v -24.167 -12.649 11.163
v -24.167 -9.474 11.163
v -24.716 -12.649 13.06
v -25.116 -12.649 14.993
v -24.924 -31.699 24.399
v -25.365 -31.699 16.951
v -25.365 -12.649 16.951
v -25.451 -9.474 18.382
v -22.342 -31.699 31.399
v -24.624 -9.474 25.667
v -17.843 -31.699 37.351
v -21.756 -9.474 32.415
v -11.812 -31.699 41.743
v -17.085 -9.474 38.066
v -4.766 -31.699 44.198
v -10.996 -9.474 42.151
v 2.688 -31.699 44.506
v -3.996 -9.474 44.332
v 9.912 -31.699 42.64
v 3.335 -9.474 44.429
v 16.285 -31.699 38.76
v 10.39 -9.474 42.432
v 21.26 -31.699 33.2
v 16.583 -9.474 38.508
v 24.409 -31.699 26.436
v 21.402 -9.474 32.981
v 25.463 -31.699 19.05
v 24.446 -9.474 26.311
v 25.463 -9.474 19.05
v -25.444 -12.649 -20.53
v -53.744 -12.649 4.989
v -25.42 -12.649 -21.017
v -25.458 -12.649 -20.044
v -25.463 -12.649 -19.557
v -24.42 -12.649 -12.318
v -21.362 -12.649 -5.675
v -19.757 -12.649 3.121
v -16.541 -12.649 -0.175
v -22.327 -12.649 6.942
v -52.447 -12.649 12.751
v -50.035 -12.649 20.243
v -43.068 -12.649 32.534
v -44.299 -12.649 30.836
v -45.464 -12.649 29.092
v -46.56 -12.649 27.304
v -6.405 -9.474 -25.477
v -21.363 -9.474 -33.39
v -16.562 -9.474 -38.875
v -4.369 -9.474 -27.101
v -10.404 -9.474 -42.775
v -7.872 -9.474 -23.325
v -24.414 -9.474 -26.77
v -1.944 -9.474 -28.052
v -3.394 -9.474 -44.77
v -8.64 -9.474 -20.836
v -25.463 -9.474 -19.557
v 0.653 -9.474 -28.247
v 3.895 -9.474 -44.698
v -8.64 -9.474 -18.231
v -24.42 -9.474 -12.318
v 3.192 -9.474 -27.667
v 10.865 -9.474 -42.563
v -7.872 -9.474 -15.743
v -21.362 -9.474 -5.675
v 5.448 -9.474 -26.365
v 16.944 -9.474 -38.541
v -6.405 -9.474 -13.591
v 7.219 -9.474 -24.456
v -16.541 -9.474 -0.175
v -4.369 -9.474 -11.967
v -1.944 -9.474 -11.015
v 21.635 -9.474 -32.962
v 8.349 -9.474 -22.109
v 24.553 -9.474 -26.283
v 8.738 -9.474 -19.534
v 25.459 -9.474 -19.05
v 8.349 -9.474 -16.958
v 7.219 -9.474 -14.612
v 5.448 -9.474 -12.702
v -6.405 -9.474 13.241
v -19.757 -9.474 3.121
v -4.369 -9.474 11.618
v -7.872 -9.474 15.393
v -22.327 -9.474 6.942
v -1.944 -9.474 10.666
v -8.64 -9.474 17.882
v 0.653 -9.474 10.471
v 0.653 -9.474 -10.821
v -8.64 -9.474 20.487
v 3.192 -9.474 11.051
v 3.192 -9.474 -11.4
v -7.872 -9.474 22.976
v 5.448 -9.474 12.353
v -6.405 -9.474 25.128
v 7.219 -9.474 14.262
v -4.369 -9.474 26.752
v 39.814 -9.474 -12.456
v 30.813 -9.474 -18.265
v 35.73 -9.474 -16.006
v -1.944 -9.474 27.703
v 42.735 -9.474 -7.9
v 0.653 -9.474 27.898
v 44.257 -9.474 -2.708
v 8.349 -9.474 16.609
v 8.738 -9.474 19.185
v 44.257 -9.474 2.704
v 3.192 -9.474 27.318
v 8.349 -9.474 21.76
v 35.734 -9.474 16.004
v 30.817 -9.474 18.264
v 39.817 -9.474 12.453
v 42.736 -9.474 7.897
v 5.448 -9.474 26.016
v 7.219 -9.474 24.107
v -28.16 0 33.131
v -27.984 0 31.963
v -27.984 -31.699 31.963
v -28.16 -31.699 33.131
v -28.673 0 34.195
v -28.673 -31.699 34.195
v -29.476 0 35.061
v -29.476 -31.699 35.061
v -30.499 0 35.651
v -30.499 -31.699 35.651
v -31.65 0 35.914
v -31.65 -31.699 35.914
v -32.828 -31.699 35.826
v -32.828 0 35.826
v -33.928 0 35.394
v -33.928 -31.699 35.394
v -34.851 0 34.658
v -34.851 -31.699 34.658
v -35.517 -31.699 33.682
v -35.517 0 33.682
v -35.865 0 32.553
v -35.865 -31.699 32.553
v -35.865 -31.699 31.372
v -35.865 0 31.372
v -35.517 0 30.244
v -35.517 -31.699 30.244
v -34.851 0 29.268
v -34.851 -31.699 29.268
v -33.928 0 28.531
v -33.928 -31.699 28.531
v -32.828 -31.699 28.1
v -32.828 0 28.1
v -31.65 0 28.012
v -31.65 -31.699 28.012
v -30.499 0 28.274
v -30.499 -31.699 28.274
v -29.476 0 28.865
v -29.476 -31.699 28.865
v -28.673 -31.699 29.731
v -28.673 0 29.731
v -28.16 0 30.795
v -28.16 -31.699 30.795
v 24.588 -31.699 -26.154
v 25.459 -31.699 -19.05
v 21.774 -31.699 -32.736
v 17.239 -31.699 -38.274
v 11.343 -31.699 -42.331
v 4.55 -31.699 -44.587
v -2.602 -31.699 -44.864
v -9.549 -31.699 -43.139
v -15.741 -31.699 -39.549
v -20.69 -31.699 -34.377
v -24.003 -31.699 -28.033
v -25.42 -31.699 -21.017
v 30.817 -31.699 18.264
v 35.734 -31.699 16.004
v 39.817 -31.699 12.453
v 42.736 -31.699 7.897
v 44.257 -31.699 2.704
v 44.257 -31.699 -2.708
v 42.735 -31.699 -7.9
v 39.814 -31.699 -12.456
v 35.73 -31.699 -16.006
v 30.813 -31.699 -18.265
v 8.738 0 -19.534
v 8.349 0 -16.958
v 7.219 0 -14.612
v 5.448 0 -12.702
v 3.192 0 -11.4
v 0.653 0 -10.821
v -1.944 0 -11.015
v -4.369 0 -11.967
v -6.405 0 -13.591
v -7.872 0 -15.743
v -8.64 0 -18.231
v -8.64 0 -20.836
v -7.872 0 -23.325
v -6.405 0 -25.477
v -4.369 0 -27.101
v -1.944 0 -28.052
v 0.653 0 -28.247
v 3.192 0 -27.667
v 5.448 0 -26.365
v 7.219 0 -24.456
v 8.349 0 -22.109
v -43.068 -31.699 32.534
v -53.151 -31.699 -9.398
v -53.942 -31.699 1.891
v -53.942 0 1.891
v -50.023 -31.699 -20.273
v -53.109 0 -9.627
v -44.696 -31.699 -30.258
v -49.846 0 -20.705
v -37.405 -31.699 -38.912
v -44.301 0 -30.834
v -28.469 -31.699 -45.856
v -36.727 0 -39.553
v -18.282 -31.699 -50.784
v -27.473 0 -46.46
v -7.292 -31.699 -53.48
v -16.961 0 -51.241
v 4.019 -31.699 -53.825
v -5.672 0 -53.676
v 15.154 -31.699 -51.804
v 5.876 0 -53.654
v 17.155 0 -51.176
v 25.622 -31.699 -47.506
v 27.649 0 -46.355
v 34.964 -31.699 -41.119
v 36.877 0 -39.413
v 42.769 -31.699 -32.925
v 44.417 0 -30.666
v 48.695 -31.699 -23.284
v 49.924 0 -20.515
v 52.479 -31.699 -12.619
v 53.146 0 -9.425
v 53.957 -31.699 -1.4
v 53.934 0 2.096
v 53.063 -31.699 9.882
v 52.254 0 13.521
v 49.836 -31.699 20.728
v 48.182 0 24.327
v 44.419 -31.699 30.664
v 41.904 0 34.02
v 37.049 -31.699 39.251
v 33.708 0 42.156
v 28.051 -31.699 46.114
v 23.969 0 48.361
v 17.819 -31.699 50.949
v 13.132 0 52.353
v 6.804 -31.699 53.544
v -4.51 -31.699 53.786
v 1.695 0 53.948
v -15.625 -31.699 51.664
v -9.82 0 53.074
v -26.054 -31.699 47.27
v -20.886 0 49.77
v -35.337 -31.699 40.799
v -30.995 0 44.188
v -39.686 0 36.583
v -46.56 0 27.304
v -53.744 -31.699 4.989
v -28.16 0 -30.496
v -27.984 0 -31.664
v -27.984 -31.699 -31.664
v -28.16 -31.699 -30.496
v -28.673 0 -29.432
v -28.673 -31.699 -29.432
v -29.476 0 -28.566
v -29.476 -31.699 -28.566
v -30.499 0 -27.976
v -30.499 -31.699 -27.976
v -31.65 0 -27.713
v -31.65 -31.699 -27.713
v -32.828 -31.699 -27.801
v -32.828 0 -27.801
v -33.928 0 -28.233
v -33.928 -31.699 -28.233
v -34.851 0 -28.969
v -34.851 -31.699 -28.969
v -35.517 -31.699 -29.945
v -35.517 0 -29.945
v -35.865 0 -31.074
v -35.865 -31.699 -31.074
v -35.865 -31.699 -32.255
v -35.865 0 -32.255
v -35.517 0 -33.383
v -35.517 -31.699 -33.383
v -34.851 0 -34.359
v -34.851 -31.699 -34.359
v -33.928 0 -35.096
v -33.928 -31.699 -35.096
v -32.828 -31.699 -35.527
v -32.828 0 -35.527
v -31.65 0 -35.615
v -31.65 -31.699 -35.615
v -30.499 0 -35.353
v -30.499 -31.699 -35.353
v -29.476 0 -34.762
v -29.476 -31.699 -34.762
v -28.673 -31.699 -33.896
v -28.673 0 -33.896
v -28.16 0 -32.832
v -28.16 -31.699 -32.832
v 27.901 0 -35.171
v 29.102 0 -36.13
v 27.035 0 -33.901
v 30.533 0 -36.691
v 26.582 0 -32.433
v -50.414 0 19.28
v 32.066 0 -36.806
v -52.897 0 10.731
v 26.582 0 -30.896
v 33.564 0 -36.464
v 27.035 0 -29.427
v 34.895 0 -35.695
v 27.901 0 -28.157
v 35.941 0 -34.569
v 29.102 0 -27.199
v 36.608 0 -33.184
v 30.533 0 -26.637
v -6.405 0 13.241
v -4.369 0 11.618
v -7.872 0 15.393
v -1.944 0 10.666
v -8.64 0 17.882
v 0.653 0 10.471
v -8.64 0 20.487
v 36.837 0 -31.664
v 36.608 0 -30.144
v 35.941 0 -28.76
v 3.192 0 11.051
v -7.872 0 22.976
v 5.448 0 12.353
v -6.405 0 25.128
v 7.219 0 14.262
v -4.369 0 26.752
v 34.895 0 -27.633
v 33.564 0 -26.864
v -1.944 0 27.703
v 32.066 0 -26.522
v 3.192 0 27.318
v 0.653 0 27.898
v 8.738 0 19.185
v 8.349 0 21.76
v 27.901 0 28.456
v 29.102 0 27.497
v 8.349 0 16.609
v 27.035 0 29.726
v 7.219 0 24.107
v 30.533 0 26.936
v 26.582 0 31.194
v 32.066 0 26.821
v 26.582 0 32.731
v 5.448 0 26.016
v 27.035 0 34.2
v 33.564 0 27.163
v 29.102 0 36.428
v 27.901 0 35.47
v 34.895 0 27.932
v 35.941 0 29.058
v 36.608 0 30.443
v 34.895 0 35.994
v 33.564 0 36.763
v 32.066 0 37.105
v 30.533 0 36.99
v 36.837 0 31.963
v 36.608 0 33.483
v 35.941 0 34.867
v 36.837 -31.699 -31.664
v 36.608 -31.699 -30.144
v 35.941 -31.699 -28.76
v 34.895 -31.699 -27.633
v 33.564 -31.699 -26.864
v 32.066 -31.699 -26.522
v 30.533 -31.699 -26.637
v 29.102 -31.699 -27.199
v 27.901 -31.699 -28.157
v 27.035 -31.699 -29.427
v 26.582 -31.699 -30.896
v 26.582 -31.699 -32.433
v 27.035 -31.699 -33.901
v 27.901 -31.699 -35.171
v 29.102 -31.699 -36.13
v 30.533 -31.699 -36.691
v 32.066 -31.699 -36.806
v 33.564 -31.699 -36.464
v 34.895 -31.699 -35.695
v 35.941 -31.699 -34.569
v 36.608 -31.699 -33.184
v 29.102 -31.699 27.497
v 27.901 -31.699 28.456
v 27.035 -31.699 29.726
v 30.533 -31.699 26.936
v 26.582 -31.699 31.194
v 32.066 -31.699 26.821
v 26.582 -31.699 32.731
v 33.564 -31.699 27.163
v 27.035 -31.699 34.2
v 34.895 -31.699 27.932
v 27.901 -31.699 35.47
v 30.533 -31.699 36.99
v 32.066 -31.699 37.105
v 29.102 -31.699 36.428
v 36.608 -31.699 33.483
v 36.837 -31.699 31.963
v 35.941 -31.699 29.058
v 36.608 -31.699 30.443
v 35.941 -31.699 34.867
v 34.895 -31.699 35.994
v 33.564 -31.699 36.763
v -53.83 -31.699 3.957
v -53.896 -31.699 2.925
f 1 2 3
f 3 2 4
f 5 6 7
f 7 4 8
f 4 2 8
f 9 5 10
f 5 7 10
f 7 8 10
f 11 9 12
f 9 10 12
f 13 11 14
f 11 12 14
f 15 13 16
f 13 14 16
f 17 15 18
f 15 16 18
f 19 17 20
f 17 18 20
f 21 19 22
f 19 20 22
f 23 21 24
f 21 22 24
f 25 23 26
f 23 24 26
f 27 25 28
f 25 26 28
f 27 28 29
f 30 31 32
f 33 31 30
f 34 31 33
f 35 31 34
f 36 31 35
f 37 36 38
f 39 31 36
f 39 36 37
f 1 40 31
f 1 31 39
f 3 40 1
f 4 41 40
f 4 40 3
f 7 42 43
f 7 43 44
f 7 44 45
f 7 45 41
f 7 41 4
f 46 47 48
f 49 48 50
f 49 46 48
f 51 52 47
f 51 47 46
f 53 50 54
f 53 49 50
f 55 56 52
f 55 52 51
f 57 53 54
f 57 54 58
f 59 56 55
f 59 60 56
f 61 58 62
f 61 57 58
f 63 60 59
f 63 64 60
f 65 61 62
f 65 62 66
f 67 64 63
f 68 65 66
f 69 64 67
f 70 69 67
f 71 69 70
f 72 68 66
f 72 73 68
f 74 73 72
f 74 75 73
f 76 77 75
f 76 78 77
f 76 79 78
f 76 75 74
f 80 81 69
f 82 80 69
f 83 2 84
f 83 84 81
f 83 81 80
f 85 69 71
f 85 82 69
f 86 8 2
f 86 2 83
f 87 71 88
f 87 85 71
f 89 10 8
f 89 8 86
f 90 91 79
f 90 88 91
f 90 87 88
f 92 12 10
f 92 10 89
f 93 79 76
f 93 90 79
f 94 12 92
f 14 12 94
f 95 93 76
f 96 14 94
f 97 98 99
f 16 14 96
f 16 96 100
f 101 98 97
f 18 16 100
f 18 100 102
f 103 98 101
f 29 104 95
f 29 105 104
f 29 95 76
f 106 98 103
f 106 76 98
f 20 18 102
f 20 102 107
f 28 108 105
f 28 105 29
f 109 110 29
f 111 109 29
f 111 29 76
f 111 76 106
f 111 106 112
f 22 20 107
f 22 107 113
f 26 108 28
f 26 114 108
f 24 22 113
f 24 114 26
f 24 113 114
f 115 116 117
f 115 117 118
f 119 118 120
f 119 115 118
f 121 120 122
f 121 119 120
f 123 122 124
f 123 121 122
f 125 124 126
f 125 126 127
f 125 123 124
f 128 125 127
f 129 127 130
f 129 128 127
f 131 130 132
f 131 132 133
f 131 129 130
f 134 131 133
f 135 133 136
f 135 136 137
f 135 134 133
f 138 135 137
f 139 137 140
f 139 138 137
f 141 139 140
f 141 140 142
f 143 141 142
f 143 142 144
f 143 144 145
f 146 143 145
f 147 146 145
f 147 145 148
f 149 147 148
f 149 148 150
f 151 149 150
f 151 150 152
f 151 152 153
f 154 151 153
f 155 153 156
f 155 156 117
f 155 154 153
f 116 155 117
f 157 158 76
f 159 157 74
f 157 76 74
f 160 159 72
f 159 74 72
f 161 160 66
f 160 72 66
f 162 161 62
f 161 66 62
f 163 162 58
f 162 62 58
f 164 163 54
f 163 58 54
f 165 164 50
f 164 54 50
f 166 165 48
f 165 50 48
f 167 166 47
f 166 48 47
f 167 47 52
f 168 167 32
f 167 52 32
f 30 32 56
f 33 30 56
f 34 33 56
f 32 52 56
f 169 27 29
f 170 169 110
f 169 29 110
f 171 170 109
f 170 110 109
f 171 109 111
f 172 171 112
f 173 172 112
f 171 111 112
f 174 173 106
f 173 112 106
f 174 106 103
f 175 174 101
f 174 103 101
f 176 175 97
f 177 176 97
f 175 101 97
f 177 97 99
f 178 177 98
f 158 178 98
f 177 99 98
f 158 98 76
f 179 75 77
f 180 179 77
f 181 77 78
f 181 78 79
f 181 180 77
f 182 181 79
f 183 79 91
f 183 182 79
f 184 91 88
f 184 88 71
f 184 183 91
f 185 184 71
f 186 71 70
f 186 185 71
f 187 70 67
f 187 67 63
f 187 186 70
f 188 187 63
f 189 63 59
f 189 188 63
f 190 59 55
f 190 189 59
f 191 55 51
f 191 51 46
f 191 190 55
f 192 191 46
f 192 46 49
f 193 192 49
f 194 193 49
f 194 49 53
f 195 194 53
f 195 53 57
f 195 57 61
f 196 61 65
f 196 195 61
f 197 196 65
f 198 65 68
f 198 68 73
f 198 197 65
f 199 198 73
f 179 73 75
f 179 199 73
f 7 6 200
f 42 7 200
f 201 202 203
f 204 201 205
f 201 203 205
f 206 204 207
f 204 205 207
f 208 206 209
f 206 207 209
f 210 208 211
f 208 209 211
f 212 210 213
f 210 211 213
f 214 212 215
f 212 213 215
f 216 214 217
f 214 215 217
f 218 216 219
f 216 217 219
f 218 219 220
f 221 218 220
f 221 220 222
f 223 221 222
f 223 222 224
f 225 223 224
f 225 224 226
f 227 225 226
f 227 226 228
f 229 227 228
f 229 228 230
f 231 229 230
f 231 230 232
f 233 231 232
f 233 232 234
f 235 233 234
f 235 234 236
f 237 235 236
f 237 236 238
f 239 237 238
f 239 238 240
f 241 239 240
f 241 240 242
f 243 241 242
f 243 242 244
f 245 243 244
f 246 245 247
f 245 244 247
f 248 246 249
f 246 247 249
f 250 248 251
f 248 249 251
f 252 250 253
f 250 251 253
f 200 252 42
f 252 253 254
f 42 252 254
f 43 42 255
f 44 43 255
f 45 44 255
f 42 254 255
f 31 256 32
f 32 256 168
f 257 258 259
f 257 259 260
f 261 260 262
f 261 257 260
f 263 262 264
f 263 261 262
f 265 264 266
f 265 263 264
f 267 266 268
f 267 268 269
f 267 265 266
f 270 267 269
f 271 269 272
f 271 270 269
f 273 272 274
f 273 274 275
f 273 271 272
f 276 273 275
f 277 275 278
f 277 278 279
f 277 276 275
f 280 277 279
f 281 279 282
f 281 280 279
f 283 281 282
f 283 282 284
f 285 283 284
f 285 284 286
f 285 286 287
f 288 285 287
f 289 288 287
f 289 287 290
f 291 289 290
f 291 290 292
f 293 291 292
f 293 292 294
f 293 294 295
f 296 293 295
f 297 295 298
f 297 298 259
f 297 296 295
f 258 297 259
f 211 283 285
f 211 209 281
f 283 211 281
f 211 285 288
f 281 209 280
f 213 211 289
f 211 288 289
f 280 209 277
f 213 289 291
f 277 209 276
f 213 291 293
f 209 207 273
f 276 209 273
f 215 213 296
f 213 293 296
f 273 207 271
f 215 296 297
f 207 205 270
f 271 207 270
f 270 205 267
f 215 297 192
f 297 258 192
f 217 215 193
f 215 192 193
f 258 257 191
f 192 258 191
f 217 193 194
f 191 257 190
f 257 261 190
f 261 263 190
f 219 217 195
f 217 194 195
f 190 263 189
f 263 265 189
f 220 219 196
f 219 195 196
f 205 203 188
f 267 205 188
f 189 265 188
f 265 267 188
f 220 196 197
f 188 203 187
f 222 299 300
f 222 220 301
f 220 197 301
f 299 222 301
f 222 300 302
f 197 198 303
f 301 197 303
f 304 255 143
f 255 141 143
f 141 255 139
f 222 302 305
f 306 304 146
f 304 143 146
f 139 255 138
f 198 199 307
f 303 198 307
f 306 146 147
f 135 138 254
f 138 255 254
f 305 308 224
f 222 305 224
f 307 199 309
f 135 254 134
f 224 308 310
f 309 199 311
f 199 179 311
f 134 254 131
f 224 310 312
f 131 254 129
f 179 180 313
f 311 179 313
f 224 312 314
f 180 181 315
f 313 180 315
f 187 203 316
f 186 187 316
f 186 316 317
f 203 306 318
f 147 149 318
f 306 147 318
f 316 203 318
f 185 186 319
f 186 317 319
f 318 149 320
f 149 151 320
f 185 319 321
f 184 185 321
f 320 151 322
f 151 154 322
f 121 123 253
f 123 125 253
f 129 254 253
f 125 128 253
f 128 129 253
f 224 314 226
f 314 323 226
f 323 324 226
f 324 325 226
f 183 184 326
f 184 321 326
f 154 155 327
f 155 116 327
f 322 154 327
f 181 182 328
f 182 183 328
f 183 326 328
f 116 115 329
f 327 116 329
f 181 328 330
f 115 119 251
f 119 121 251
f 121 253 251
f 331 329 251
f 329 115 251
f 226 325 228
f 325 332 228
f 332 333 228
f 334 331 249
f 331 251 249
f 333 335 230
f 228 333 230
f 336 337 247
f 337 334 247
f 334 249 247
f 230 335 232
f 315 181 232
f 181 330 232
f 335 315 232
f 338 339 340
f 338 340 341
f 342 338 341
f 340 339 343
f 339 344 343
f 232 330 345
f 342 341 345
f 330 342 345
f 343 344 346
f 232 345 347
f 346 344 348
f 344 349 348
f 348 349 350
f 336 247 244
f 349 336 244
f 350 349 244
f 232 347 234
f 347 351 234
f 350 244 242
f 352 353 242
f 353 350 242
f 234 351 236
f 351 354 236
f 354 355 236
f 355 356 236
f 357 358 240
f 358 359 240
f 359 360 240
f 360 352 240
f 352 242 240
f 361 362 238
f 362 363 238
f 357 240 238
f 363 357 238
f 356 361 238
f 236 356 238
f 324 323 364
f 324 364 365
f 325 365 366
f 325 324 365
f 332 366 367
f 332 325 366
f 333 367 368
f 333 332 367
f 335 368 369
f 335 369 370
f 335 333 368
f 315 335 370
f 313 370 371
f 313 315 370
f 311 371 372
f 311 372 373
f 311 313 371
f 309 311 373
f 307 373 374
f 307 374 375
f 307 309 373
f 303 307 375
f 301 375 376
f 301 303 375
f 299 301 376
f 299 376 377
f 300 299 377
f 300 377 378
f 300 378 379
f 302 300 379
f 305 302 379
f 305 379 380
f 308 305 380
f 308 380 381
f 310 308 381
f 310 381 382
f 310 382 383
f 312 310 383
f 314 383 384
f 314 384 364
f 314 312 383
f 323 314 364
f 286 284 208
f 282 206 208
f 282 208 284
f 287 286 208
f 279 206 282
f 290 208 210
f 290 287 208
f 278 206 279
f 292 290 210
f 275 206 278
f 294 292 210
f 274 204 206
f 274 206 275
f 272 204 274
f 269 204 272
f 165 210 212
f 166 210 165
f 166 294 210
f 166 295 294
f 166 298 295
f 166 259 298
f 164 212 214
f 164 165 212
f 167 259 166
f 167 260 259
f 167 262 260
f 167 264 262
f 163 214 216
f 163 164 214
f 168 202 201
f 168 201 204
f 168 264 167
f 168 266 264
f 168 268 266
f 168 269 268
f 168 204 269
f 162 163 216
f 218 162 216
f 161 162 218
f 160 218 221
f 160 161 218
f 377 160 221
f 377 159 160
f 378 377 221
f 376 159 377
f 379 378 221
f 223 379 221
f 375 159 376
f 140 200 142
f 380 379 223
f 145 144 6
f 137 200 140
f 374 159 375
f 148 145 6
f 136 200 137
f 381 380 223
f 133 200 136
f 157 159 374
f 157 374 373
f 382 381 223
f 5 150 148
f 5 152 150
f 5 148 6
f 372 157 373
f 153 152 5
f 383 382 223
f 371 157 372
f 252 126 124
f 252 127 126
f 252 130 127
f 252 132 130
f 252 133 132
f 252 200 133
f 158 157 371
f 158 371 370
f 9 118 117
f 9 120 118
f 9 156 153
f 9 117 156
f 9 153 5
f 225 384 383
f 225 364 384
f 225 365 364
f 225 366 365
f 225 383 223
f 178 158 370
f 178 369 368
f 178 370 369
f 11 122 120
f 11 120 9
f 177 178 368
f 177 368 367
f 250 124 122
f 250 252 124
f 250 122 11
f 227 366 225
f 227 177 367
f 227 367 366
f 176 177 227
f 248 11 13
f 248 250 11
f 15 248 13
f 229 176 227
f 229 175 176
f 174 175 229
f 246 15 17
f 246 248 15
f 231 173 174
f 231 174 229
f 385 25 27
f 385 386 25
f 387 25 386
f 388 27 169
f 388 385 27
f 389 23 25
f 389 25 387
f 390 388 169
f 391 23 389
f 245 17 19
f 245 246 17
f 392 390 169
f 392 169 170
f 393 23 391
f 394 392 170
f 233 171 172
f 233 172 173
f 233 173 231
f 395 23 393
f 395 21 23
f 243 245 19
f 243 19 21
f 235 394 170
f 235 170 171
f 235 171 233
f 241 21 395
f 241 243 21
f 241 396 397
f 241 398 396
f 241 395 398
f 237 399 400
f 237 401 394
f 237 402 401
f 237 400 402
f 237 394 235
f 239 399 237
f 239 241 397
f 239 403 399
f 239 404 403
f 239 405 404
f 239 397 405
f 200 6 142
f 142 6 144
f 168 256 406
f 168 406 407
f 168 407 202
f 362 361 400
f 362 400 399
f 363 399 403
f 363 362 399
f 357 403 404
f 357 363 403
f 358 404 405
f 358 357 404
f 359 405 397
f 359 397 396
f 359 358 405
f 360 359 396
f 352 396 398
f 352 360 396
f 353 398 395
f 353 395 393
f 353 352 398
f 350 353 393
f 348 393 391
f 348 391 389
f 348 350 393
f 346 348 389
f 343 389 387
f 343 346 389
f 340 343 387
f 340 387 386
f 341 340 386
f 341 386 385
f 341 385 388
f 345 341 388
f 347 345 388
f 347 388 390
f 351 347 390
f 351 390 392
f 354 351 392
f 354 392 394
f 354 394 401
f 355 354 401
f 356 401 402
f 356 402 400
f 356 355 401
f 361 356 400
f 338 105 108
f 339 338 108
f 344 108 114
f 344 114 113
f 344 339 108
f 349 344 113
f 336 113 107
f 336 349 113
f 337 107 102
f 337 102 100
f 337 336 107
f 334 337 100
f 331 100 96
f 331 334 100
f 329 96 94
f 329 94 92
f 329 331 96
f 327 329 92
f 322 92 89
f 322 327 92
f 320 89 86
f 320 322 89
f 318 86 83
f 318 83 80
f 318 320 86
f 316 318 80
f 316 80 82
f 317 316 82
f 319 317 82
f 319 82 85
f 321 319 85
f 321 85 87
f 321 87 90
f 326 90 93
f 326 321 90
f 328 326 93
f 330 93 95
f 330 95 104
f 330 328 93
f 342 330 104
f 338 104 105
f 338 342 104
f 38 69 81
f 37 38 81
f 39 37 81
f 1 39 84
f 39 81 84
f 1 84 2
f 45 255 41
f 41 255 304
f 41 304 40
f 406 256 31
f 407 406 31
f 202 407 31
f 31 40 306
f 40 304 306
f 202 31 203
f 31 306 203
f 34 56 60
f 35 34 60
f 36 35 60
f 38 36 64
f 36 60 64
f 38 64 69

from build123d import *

# Parameters (mm, degrees)
F0_R     = 3.9624
F0_R_2   = 5.1562
F1_DEPTH = 31.6992
F0_R_3   = 8.7376
F2_DEPTH = 9.4742
F4_DEPTH = 19.05


with BuildPart() as f1:
    # F0 (on Front) → F1 (new body)
    with BuildSketch(Plane.XZ):
        with BuildLine():
            ThreePointArc((-53.9418684482, 1.8908869118), (-0.945588575, -53.9667164764), (53.975, 0))
            ThreePointArc((53.975, 0), (14.14638739, 52.0881977881), (-46.559704912, 27.3037452286))
            Line((-46.559704912, 27.3037452286), (-24.1670829241, 11.1631898628))
            ThreePointArc((-24.1670829241, 11.1631898628), (-3.9962450465, 44.3324916596), (25.4631440543, 19.0498953495))
            ThreePointArc((25.4631440543, 19.0498953495), (44.449999882, -0.0021200322), (25.4589040116, -19.049908932))
            ThreePointArc((25.4589040116, -19.049908932), (0.2533724347, -44.9959238654), (-25.463489659, -19.5566330526))
            Line((-25.463489659, -19.5566330526), (-53.9418684482, 1.8908869118))
        make_face()
        with Locations((-31.9465398788, -31.6641107202)):
            Circle(F0_R, mode=Mode.SUBTRACT)
        with Locations((31.6804601212, -31.6641107202)):
            Circle(F0_R_2, mode=Mode.SUBTRACT)
        with Locations((-31.9465398788, 31.9628892798)):
            Circle(F0_R, mode=Mode.SUBTRACT)
        with Locations((31.6804601212, 31.9628892798)):
            Circle(F0_R_2, mode=Mode.SUBTRACT)
        with BuildLine():
            Line((-24.1670829241, 11.1631898628), (-46.559704912, 27.3037452286))
            ThreePointArc((-46.559704912, 27.3037452286), (-51.8323731265, 15.0567500169), (-53.9418684482, 1.8908869118))
            Line((-53.9418684482, 1.8908869118), (-25.463489659, -19.5566330526))
            ThreePointArc((-25.463489659, -19.5566330526), (-23.1304283544, -8.8860032088), (-16.5413044773, -0.174576067))
            ThreePointArc((-16.5413044773, -0.174576067), (-21.1288768106, 4.9732552376), (-24.1670829241, 11.1631898628))
        make_face()
    extrude(amount=F1_DEPTH)

    # F0 (on Front) → F2 (join)
    with BuildSketch(Plane.XZ):
        with BuildLine():
            ThreePointArc((25.4631440543, 19.0498953495), (-3.9962450465, 44.3324916596), (-24.1670829241, 11.1631898628))
            ThreePointArc((-24.1670829241, 11.1631898628), (-21.1288768106, 4.9732552376), (-16.5413044773, -0.174576067))
            ThreePointArc((-16.5413044773, -0.174576067), (-23.1304283544, -8.8860032088), (-25.463489659, -19.5566330526))
            ThreePointArc((-25.463489659, -19.5566330526), (0.2533724347, -44.9959238654), (25.4589040116, -19.049908932))
            ThreePointArc((25.4589040116, -19.049908932), (23.0233343799, -8.6563729399), (16.5413044773, -0.174576067))
            ThreePointArc((16.5413044773, -0.174576067), (23.0973699676, 8.4653284163), (25.4631440543, 19.0498953495))
        make_face()
        with Locations((0, -19.5336844772)):
            Circle(F0_R_3, mode=Mode.SUBTRACT)
        with Locations((0, 19.1845323432)):
            Circle(F0_R_3, mode=Mode.SUBTRACT)
        with BuildLine():
            ThreePointArc((25.4589040116, -19.049908932), (44.449999882, -0.0021200322), (25.4631440543, 19.0498953495))
            ThreePointArc((25.4631440543, 19.0498953495), (23.0973699676, 8.4653284163), (16.5413044773, -0.174576067))
            ThreePointArc((16.5413044773, -0.174576067), (23.0233343799, -8.6563729399), (25.4589040116, -19.049908932))
        make_face()
    extrude(amount=F2_DEPTH)

    # F3 (on face) → F4 (cut)
    with BuildSketch(Plane.XZ.offset(31.6992)):
        with BuildLine():
            ThreePointArc((-16.5413044773, -0.174576067), (-22.6355522481, 7.5217022119), (-25.3653949946, 16.9514696437))
            Line((-25.3653949946, 16.9514696437), (-43.0676051814, 32.5343204776))
            ThreePointArc((-43.0676051814, 32.5343204776), (-50.3270192168, 19.5061980343), (-53.7439555951, 4.988773596))
            Line((-53.7439555951, 4.988773596), (-25.4202754774, -21.0167309709))
            ThreePointArc((-25.4202754774, -21.0167309709), (-23.4263186039, -9.5538333302), (-16.5413044773, -0.174576067))
        make_face()
    extrude(amount=-F4_DEPTH, mode=Mode.SUBTRACT)


solid = f1.part
